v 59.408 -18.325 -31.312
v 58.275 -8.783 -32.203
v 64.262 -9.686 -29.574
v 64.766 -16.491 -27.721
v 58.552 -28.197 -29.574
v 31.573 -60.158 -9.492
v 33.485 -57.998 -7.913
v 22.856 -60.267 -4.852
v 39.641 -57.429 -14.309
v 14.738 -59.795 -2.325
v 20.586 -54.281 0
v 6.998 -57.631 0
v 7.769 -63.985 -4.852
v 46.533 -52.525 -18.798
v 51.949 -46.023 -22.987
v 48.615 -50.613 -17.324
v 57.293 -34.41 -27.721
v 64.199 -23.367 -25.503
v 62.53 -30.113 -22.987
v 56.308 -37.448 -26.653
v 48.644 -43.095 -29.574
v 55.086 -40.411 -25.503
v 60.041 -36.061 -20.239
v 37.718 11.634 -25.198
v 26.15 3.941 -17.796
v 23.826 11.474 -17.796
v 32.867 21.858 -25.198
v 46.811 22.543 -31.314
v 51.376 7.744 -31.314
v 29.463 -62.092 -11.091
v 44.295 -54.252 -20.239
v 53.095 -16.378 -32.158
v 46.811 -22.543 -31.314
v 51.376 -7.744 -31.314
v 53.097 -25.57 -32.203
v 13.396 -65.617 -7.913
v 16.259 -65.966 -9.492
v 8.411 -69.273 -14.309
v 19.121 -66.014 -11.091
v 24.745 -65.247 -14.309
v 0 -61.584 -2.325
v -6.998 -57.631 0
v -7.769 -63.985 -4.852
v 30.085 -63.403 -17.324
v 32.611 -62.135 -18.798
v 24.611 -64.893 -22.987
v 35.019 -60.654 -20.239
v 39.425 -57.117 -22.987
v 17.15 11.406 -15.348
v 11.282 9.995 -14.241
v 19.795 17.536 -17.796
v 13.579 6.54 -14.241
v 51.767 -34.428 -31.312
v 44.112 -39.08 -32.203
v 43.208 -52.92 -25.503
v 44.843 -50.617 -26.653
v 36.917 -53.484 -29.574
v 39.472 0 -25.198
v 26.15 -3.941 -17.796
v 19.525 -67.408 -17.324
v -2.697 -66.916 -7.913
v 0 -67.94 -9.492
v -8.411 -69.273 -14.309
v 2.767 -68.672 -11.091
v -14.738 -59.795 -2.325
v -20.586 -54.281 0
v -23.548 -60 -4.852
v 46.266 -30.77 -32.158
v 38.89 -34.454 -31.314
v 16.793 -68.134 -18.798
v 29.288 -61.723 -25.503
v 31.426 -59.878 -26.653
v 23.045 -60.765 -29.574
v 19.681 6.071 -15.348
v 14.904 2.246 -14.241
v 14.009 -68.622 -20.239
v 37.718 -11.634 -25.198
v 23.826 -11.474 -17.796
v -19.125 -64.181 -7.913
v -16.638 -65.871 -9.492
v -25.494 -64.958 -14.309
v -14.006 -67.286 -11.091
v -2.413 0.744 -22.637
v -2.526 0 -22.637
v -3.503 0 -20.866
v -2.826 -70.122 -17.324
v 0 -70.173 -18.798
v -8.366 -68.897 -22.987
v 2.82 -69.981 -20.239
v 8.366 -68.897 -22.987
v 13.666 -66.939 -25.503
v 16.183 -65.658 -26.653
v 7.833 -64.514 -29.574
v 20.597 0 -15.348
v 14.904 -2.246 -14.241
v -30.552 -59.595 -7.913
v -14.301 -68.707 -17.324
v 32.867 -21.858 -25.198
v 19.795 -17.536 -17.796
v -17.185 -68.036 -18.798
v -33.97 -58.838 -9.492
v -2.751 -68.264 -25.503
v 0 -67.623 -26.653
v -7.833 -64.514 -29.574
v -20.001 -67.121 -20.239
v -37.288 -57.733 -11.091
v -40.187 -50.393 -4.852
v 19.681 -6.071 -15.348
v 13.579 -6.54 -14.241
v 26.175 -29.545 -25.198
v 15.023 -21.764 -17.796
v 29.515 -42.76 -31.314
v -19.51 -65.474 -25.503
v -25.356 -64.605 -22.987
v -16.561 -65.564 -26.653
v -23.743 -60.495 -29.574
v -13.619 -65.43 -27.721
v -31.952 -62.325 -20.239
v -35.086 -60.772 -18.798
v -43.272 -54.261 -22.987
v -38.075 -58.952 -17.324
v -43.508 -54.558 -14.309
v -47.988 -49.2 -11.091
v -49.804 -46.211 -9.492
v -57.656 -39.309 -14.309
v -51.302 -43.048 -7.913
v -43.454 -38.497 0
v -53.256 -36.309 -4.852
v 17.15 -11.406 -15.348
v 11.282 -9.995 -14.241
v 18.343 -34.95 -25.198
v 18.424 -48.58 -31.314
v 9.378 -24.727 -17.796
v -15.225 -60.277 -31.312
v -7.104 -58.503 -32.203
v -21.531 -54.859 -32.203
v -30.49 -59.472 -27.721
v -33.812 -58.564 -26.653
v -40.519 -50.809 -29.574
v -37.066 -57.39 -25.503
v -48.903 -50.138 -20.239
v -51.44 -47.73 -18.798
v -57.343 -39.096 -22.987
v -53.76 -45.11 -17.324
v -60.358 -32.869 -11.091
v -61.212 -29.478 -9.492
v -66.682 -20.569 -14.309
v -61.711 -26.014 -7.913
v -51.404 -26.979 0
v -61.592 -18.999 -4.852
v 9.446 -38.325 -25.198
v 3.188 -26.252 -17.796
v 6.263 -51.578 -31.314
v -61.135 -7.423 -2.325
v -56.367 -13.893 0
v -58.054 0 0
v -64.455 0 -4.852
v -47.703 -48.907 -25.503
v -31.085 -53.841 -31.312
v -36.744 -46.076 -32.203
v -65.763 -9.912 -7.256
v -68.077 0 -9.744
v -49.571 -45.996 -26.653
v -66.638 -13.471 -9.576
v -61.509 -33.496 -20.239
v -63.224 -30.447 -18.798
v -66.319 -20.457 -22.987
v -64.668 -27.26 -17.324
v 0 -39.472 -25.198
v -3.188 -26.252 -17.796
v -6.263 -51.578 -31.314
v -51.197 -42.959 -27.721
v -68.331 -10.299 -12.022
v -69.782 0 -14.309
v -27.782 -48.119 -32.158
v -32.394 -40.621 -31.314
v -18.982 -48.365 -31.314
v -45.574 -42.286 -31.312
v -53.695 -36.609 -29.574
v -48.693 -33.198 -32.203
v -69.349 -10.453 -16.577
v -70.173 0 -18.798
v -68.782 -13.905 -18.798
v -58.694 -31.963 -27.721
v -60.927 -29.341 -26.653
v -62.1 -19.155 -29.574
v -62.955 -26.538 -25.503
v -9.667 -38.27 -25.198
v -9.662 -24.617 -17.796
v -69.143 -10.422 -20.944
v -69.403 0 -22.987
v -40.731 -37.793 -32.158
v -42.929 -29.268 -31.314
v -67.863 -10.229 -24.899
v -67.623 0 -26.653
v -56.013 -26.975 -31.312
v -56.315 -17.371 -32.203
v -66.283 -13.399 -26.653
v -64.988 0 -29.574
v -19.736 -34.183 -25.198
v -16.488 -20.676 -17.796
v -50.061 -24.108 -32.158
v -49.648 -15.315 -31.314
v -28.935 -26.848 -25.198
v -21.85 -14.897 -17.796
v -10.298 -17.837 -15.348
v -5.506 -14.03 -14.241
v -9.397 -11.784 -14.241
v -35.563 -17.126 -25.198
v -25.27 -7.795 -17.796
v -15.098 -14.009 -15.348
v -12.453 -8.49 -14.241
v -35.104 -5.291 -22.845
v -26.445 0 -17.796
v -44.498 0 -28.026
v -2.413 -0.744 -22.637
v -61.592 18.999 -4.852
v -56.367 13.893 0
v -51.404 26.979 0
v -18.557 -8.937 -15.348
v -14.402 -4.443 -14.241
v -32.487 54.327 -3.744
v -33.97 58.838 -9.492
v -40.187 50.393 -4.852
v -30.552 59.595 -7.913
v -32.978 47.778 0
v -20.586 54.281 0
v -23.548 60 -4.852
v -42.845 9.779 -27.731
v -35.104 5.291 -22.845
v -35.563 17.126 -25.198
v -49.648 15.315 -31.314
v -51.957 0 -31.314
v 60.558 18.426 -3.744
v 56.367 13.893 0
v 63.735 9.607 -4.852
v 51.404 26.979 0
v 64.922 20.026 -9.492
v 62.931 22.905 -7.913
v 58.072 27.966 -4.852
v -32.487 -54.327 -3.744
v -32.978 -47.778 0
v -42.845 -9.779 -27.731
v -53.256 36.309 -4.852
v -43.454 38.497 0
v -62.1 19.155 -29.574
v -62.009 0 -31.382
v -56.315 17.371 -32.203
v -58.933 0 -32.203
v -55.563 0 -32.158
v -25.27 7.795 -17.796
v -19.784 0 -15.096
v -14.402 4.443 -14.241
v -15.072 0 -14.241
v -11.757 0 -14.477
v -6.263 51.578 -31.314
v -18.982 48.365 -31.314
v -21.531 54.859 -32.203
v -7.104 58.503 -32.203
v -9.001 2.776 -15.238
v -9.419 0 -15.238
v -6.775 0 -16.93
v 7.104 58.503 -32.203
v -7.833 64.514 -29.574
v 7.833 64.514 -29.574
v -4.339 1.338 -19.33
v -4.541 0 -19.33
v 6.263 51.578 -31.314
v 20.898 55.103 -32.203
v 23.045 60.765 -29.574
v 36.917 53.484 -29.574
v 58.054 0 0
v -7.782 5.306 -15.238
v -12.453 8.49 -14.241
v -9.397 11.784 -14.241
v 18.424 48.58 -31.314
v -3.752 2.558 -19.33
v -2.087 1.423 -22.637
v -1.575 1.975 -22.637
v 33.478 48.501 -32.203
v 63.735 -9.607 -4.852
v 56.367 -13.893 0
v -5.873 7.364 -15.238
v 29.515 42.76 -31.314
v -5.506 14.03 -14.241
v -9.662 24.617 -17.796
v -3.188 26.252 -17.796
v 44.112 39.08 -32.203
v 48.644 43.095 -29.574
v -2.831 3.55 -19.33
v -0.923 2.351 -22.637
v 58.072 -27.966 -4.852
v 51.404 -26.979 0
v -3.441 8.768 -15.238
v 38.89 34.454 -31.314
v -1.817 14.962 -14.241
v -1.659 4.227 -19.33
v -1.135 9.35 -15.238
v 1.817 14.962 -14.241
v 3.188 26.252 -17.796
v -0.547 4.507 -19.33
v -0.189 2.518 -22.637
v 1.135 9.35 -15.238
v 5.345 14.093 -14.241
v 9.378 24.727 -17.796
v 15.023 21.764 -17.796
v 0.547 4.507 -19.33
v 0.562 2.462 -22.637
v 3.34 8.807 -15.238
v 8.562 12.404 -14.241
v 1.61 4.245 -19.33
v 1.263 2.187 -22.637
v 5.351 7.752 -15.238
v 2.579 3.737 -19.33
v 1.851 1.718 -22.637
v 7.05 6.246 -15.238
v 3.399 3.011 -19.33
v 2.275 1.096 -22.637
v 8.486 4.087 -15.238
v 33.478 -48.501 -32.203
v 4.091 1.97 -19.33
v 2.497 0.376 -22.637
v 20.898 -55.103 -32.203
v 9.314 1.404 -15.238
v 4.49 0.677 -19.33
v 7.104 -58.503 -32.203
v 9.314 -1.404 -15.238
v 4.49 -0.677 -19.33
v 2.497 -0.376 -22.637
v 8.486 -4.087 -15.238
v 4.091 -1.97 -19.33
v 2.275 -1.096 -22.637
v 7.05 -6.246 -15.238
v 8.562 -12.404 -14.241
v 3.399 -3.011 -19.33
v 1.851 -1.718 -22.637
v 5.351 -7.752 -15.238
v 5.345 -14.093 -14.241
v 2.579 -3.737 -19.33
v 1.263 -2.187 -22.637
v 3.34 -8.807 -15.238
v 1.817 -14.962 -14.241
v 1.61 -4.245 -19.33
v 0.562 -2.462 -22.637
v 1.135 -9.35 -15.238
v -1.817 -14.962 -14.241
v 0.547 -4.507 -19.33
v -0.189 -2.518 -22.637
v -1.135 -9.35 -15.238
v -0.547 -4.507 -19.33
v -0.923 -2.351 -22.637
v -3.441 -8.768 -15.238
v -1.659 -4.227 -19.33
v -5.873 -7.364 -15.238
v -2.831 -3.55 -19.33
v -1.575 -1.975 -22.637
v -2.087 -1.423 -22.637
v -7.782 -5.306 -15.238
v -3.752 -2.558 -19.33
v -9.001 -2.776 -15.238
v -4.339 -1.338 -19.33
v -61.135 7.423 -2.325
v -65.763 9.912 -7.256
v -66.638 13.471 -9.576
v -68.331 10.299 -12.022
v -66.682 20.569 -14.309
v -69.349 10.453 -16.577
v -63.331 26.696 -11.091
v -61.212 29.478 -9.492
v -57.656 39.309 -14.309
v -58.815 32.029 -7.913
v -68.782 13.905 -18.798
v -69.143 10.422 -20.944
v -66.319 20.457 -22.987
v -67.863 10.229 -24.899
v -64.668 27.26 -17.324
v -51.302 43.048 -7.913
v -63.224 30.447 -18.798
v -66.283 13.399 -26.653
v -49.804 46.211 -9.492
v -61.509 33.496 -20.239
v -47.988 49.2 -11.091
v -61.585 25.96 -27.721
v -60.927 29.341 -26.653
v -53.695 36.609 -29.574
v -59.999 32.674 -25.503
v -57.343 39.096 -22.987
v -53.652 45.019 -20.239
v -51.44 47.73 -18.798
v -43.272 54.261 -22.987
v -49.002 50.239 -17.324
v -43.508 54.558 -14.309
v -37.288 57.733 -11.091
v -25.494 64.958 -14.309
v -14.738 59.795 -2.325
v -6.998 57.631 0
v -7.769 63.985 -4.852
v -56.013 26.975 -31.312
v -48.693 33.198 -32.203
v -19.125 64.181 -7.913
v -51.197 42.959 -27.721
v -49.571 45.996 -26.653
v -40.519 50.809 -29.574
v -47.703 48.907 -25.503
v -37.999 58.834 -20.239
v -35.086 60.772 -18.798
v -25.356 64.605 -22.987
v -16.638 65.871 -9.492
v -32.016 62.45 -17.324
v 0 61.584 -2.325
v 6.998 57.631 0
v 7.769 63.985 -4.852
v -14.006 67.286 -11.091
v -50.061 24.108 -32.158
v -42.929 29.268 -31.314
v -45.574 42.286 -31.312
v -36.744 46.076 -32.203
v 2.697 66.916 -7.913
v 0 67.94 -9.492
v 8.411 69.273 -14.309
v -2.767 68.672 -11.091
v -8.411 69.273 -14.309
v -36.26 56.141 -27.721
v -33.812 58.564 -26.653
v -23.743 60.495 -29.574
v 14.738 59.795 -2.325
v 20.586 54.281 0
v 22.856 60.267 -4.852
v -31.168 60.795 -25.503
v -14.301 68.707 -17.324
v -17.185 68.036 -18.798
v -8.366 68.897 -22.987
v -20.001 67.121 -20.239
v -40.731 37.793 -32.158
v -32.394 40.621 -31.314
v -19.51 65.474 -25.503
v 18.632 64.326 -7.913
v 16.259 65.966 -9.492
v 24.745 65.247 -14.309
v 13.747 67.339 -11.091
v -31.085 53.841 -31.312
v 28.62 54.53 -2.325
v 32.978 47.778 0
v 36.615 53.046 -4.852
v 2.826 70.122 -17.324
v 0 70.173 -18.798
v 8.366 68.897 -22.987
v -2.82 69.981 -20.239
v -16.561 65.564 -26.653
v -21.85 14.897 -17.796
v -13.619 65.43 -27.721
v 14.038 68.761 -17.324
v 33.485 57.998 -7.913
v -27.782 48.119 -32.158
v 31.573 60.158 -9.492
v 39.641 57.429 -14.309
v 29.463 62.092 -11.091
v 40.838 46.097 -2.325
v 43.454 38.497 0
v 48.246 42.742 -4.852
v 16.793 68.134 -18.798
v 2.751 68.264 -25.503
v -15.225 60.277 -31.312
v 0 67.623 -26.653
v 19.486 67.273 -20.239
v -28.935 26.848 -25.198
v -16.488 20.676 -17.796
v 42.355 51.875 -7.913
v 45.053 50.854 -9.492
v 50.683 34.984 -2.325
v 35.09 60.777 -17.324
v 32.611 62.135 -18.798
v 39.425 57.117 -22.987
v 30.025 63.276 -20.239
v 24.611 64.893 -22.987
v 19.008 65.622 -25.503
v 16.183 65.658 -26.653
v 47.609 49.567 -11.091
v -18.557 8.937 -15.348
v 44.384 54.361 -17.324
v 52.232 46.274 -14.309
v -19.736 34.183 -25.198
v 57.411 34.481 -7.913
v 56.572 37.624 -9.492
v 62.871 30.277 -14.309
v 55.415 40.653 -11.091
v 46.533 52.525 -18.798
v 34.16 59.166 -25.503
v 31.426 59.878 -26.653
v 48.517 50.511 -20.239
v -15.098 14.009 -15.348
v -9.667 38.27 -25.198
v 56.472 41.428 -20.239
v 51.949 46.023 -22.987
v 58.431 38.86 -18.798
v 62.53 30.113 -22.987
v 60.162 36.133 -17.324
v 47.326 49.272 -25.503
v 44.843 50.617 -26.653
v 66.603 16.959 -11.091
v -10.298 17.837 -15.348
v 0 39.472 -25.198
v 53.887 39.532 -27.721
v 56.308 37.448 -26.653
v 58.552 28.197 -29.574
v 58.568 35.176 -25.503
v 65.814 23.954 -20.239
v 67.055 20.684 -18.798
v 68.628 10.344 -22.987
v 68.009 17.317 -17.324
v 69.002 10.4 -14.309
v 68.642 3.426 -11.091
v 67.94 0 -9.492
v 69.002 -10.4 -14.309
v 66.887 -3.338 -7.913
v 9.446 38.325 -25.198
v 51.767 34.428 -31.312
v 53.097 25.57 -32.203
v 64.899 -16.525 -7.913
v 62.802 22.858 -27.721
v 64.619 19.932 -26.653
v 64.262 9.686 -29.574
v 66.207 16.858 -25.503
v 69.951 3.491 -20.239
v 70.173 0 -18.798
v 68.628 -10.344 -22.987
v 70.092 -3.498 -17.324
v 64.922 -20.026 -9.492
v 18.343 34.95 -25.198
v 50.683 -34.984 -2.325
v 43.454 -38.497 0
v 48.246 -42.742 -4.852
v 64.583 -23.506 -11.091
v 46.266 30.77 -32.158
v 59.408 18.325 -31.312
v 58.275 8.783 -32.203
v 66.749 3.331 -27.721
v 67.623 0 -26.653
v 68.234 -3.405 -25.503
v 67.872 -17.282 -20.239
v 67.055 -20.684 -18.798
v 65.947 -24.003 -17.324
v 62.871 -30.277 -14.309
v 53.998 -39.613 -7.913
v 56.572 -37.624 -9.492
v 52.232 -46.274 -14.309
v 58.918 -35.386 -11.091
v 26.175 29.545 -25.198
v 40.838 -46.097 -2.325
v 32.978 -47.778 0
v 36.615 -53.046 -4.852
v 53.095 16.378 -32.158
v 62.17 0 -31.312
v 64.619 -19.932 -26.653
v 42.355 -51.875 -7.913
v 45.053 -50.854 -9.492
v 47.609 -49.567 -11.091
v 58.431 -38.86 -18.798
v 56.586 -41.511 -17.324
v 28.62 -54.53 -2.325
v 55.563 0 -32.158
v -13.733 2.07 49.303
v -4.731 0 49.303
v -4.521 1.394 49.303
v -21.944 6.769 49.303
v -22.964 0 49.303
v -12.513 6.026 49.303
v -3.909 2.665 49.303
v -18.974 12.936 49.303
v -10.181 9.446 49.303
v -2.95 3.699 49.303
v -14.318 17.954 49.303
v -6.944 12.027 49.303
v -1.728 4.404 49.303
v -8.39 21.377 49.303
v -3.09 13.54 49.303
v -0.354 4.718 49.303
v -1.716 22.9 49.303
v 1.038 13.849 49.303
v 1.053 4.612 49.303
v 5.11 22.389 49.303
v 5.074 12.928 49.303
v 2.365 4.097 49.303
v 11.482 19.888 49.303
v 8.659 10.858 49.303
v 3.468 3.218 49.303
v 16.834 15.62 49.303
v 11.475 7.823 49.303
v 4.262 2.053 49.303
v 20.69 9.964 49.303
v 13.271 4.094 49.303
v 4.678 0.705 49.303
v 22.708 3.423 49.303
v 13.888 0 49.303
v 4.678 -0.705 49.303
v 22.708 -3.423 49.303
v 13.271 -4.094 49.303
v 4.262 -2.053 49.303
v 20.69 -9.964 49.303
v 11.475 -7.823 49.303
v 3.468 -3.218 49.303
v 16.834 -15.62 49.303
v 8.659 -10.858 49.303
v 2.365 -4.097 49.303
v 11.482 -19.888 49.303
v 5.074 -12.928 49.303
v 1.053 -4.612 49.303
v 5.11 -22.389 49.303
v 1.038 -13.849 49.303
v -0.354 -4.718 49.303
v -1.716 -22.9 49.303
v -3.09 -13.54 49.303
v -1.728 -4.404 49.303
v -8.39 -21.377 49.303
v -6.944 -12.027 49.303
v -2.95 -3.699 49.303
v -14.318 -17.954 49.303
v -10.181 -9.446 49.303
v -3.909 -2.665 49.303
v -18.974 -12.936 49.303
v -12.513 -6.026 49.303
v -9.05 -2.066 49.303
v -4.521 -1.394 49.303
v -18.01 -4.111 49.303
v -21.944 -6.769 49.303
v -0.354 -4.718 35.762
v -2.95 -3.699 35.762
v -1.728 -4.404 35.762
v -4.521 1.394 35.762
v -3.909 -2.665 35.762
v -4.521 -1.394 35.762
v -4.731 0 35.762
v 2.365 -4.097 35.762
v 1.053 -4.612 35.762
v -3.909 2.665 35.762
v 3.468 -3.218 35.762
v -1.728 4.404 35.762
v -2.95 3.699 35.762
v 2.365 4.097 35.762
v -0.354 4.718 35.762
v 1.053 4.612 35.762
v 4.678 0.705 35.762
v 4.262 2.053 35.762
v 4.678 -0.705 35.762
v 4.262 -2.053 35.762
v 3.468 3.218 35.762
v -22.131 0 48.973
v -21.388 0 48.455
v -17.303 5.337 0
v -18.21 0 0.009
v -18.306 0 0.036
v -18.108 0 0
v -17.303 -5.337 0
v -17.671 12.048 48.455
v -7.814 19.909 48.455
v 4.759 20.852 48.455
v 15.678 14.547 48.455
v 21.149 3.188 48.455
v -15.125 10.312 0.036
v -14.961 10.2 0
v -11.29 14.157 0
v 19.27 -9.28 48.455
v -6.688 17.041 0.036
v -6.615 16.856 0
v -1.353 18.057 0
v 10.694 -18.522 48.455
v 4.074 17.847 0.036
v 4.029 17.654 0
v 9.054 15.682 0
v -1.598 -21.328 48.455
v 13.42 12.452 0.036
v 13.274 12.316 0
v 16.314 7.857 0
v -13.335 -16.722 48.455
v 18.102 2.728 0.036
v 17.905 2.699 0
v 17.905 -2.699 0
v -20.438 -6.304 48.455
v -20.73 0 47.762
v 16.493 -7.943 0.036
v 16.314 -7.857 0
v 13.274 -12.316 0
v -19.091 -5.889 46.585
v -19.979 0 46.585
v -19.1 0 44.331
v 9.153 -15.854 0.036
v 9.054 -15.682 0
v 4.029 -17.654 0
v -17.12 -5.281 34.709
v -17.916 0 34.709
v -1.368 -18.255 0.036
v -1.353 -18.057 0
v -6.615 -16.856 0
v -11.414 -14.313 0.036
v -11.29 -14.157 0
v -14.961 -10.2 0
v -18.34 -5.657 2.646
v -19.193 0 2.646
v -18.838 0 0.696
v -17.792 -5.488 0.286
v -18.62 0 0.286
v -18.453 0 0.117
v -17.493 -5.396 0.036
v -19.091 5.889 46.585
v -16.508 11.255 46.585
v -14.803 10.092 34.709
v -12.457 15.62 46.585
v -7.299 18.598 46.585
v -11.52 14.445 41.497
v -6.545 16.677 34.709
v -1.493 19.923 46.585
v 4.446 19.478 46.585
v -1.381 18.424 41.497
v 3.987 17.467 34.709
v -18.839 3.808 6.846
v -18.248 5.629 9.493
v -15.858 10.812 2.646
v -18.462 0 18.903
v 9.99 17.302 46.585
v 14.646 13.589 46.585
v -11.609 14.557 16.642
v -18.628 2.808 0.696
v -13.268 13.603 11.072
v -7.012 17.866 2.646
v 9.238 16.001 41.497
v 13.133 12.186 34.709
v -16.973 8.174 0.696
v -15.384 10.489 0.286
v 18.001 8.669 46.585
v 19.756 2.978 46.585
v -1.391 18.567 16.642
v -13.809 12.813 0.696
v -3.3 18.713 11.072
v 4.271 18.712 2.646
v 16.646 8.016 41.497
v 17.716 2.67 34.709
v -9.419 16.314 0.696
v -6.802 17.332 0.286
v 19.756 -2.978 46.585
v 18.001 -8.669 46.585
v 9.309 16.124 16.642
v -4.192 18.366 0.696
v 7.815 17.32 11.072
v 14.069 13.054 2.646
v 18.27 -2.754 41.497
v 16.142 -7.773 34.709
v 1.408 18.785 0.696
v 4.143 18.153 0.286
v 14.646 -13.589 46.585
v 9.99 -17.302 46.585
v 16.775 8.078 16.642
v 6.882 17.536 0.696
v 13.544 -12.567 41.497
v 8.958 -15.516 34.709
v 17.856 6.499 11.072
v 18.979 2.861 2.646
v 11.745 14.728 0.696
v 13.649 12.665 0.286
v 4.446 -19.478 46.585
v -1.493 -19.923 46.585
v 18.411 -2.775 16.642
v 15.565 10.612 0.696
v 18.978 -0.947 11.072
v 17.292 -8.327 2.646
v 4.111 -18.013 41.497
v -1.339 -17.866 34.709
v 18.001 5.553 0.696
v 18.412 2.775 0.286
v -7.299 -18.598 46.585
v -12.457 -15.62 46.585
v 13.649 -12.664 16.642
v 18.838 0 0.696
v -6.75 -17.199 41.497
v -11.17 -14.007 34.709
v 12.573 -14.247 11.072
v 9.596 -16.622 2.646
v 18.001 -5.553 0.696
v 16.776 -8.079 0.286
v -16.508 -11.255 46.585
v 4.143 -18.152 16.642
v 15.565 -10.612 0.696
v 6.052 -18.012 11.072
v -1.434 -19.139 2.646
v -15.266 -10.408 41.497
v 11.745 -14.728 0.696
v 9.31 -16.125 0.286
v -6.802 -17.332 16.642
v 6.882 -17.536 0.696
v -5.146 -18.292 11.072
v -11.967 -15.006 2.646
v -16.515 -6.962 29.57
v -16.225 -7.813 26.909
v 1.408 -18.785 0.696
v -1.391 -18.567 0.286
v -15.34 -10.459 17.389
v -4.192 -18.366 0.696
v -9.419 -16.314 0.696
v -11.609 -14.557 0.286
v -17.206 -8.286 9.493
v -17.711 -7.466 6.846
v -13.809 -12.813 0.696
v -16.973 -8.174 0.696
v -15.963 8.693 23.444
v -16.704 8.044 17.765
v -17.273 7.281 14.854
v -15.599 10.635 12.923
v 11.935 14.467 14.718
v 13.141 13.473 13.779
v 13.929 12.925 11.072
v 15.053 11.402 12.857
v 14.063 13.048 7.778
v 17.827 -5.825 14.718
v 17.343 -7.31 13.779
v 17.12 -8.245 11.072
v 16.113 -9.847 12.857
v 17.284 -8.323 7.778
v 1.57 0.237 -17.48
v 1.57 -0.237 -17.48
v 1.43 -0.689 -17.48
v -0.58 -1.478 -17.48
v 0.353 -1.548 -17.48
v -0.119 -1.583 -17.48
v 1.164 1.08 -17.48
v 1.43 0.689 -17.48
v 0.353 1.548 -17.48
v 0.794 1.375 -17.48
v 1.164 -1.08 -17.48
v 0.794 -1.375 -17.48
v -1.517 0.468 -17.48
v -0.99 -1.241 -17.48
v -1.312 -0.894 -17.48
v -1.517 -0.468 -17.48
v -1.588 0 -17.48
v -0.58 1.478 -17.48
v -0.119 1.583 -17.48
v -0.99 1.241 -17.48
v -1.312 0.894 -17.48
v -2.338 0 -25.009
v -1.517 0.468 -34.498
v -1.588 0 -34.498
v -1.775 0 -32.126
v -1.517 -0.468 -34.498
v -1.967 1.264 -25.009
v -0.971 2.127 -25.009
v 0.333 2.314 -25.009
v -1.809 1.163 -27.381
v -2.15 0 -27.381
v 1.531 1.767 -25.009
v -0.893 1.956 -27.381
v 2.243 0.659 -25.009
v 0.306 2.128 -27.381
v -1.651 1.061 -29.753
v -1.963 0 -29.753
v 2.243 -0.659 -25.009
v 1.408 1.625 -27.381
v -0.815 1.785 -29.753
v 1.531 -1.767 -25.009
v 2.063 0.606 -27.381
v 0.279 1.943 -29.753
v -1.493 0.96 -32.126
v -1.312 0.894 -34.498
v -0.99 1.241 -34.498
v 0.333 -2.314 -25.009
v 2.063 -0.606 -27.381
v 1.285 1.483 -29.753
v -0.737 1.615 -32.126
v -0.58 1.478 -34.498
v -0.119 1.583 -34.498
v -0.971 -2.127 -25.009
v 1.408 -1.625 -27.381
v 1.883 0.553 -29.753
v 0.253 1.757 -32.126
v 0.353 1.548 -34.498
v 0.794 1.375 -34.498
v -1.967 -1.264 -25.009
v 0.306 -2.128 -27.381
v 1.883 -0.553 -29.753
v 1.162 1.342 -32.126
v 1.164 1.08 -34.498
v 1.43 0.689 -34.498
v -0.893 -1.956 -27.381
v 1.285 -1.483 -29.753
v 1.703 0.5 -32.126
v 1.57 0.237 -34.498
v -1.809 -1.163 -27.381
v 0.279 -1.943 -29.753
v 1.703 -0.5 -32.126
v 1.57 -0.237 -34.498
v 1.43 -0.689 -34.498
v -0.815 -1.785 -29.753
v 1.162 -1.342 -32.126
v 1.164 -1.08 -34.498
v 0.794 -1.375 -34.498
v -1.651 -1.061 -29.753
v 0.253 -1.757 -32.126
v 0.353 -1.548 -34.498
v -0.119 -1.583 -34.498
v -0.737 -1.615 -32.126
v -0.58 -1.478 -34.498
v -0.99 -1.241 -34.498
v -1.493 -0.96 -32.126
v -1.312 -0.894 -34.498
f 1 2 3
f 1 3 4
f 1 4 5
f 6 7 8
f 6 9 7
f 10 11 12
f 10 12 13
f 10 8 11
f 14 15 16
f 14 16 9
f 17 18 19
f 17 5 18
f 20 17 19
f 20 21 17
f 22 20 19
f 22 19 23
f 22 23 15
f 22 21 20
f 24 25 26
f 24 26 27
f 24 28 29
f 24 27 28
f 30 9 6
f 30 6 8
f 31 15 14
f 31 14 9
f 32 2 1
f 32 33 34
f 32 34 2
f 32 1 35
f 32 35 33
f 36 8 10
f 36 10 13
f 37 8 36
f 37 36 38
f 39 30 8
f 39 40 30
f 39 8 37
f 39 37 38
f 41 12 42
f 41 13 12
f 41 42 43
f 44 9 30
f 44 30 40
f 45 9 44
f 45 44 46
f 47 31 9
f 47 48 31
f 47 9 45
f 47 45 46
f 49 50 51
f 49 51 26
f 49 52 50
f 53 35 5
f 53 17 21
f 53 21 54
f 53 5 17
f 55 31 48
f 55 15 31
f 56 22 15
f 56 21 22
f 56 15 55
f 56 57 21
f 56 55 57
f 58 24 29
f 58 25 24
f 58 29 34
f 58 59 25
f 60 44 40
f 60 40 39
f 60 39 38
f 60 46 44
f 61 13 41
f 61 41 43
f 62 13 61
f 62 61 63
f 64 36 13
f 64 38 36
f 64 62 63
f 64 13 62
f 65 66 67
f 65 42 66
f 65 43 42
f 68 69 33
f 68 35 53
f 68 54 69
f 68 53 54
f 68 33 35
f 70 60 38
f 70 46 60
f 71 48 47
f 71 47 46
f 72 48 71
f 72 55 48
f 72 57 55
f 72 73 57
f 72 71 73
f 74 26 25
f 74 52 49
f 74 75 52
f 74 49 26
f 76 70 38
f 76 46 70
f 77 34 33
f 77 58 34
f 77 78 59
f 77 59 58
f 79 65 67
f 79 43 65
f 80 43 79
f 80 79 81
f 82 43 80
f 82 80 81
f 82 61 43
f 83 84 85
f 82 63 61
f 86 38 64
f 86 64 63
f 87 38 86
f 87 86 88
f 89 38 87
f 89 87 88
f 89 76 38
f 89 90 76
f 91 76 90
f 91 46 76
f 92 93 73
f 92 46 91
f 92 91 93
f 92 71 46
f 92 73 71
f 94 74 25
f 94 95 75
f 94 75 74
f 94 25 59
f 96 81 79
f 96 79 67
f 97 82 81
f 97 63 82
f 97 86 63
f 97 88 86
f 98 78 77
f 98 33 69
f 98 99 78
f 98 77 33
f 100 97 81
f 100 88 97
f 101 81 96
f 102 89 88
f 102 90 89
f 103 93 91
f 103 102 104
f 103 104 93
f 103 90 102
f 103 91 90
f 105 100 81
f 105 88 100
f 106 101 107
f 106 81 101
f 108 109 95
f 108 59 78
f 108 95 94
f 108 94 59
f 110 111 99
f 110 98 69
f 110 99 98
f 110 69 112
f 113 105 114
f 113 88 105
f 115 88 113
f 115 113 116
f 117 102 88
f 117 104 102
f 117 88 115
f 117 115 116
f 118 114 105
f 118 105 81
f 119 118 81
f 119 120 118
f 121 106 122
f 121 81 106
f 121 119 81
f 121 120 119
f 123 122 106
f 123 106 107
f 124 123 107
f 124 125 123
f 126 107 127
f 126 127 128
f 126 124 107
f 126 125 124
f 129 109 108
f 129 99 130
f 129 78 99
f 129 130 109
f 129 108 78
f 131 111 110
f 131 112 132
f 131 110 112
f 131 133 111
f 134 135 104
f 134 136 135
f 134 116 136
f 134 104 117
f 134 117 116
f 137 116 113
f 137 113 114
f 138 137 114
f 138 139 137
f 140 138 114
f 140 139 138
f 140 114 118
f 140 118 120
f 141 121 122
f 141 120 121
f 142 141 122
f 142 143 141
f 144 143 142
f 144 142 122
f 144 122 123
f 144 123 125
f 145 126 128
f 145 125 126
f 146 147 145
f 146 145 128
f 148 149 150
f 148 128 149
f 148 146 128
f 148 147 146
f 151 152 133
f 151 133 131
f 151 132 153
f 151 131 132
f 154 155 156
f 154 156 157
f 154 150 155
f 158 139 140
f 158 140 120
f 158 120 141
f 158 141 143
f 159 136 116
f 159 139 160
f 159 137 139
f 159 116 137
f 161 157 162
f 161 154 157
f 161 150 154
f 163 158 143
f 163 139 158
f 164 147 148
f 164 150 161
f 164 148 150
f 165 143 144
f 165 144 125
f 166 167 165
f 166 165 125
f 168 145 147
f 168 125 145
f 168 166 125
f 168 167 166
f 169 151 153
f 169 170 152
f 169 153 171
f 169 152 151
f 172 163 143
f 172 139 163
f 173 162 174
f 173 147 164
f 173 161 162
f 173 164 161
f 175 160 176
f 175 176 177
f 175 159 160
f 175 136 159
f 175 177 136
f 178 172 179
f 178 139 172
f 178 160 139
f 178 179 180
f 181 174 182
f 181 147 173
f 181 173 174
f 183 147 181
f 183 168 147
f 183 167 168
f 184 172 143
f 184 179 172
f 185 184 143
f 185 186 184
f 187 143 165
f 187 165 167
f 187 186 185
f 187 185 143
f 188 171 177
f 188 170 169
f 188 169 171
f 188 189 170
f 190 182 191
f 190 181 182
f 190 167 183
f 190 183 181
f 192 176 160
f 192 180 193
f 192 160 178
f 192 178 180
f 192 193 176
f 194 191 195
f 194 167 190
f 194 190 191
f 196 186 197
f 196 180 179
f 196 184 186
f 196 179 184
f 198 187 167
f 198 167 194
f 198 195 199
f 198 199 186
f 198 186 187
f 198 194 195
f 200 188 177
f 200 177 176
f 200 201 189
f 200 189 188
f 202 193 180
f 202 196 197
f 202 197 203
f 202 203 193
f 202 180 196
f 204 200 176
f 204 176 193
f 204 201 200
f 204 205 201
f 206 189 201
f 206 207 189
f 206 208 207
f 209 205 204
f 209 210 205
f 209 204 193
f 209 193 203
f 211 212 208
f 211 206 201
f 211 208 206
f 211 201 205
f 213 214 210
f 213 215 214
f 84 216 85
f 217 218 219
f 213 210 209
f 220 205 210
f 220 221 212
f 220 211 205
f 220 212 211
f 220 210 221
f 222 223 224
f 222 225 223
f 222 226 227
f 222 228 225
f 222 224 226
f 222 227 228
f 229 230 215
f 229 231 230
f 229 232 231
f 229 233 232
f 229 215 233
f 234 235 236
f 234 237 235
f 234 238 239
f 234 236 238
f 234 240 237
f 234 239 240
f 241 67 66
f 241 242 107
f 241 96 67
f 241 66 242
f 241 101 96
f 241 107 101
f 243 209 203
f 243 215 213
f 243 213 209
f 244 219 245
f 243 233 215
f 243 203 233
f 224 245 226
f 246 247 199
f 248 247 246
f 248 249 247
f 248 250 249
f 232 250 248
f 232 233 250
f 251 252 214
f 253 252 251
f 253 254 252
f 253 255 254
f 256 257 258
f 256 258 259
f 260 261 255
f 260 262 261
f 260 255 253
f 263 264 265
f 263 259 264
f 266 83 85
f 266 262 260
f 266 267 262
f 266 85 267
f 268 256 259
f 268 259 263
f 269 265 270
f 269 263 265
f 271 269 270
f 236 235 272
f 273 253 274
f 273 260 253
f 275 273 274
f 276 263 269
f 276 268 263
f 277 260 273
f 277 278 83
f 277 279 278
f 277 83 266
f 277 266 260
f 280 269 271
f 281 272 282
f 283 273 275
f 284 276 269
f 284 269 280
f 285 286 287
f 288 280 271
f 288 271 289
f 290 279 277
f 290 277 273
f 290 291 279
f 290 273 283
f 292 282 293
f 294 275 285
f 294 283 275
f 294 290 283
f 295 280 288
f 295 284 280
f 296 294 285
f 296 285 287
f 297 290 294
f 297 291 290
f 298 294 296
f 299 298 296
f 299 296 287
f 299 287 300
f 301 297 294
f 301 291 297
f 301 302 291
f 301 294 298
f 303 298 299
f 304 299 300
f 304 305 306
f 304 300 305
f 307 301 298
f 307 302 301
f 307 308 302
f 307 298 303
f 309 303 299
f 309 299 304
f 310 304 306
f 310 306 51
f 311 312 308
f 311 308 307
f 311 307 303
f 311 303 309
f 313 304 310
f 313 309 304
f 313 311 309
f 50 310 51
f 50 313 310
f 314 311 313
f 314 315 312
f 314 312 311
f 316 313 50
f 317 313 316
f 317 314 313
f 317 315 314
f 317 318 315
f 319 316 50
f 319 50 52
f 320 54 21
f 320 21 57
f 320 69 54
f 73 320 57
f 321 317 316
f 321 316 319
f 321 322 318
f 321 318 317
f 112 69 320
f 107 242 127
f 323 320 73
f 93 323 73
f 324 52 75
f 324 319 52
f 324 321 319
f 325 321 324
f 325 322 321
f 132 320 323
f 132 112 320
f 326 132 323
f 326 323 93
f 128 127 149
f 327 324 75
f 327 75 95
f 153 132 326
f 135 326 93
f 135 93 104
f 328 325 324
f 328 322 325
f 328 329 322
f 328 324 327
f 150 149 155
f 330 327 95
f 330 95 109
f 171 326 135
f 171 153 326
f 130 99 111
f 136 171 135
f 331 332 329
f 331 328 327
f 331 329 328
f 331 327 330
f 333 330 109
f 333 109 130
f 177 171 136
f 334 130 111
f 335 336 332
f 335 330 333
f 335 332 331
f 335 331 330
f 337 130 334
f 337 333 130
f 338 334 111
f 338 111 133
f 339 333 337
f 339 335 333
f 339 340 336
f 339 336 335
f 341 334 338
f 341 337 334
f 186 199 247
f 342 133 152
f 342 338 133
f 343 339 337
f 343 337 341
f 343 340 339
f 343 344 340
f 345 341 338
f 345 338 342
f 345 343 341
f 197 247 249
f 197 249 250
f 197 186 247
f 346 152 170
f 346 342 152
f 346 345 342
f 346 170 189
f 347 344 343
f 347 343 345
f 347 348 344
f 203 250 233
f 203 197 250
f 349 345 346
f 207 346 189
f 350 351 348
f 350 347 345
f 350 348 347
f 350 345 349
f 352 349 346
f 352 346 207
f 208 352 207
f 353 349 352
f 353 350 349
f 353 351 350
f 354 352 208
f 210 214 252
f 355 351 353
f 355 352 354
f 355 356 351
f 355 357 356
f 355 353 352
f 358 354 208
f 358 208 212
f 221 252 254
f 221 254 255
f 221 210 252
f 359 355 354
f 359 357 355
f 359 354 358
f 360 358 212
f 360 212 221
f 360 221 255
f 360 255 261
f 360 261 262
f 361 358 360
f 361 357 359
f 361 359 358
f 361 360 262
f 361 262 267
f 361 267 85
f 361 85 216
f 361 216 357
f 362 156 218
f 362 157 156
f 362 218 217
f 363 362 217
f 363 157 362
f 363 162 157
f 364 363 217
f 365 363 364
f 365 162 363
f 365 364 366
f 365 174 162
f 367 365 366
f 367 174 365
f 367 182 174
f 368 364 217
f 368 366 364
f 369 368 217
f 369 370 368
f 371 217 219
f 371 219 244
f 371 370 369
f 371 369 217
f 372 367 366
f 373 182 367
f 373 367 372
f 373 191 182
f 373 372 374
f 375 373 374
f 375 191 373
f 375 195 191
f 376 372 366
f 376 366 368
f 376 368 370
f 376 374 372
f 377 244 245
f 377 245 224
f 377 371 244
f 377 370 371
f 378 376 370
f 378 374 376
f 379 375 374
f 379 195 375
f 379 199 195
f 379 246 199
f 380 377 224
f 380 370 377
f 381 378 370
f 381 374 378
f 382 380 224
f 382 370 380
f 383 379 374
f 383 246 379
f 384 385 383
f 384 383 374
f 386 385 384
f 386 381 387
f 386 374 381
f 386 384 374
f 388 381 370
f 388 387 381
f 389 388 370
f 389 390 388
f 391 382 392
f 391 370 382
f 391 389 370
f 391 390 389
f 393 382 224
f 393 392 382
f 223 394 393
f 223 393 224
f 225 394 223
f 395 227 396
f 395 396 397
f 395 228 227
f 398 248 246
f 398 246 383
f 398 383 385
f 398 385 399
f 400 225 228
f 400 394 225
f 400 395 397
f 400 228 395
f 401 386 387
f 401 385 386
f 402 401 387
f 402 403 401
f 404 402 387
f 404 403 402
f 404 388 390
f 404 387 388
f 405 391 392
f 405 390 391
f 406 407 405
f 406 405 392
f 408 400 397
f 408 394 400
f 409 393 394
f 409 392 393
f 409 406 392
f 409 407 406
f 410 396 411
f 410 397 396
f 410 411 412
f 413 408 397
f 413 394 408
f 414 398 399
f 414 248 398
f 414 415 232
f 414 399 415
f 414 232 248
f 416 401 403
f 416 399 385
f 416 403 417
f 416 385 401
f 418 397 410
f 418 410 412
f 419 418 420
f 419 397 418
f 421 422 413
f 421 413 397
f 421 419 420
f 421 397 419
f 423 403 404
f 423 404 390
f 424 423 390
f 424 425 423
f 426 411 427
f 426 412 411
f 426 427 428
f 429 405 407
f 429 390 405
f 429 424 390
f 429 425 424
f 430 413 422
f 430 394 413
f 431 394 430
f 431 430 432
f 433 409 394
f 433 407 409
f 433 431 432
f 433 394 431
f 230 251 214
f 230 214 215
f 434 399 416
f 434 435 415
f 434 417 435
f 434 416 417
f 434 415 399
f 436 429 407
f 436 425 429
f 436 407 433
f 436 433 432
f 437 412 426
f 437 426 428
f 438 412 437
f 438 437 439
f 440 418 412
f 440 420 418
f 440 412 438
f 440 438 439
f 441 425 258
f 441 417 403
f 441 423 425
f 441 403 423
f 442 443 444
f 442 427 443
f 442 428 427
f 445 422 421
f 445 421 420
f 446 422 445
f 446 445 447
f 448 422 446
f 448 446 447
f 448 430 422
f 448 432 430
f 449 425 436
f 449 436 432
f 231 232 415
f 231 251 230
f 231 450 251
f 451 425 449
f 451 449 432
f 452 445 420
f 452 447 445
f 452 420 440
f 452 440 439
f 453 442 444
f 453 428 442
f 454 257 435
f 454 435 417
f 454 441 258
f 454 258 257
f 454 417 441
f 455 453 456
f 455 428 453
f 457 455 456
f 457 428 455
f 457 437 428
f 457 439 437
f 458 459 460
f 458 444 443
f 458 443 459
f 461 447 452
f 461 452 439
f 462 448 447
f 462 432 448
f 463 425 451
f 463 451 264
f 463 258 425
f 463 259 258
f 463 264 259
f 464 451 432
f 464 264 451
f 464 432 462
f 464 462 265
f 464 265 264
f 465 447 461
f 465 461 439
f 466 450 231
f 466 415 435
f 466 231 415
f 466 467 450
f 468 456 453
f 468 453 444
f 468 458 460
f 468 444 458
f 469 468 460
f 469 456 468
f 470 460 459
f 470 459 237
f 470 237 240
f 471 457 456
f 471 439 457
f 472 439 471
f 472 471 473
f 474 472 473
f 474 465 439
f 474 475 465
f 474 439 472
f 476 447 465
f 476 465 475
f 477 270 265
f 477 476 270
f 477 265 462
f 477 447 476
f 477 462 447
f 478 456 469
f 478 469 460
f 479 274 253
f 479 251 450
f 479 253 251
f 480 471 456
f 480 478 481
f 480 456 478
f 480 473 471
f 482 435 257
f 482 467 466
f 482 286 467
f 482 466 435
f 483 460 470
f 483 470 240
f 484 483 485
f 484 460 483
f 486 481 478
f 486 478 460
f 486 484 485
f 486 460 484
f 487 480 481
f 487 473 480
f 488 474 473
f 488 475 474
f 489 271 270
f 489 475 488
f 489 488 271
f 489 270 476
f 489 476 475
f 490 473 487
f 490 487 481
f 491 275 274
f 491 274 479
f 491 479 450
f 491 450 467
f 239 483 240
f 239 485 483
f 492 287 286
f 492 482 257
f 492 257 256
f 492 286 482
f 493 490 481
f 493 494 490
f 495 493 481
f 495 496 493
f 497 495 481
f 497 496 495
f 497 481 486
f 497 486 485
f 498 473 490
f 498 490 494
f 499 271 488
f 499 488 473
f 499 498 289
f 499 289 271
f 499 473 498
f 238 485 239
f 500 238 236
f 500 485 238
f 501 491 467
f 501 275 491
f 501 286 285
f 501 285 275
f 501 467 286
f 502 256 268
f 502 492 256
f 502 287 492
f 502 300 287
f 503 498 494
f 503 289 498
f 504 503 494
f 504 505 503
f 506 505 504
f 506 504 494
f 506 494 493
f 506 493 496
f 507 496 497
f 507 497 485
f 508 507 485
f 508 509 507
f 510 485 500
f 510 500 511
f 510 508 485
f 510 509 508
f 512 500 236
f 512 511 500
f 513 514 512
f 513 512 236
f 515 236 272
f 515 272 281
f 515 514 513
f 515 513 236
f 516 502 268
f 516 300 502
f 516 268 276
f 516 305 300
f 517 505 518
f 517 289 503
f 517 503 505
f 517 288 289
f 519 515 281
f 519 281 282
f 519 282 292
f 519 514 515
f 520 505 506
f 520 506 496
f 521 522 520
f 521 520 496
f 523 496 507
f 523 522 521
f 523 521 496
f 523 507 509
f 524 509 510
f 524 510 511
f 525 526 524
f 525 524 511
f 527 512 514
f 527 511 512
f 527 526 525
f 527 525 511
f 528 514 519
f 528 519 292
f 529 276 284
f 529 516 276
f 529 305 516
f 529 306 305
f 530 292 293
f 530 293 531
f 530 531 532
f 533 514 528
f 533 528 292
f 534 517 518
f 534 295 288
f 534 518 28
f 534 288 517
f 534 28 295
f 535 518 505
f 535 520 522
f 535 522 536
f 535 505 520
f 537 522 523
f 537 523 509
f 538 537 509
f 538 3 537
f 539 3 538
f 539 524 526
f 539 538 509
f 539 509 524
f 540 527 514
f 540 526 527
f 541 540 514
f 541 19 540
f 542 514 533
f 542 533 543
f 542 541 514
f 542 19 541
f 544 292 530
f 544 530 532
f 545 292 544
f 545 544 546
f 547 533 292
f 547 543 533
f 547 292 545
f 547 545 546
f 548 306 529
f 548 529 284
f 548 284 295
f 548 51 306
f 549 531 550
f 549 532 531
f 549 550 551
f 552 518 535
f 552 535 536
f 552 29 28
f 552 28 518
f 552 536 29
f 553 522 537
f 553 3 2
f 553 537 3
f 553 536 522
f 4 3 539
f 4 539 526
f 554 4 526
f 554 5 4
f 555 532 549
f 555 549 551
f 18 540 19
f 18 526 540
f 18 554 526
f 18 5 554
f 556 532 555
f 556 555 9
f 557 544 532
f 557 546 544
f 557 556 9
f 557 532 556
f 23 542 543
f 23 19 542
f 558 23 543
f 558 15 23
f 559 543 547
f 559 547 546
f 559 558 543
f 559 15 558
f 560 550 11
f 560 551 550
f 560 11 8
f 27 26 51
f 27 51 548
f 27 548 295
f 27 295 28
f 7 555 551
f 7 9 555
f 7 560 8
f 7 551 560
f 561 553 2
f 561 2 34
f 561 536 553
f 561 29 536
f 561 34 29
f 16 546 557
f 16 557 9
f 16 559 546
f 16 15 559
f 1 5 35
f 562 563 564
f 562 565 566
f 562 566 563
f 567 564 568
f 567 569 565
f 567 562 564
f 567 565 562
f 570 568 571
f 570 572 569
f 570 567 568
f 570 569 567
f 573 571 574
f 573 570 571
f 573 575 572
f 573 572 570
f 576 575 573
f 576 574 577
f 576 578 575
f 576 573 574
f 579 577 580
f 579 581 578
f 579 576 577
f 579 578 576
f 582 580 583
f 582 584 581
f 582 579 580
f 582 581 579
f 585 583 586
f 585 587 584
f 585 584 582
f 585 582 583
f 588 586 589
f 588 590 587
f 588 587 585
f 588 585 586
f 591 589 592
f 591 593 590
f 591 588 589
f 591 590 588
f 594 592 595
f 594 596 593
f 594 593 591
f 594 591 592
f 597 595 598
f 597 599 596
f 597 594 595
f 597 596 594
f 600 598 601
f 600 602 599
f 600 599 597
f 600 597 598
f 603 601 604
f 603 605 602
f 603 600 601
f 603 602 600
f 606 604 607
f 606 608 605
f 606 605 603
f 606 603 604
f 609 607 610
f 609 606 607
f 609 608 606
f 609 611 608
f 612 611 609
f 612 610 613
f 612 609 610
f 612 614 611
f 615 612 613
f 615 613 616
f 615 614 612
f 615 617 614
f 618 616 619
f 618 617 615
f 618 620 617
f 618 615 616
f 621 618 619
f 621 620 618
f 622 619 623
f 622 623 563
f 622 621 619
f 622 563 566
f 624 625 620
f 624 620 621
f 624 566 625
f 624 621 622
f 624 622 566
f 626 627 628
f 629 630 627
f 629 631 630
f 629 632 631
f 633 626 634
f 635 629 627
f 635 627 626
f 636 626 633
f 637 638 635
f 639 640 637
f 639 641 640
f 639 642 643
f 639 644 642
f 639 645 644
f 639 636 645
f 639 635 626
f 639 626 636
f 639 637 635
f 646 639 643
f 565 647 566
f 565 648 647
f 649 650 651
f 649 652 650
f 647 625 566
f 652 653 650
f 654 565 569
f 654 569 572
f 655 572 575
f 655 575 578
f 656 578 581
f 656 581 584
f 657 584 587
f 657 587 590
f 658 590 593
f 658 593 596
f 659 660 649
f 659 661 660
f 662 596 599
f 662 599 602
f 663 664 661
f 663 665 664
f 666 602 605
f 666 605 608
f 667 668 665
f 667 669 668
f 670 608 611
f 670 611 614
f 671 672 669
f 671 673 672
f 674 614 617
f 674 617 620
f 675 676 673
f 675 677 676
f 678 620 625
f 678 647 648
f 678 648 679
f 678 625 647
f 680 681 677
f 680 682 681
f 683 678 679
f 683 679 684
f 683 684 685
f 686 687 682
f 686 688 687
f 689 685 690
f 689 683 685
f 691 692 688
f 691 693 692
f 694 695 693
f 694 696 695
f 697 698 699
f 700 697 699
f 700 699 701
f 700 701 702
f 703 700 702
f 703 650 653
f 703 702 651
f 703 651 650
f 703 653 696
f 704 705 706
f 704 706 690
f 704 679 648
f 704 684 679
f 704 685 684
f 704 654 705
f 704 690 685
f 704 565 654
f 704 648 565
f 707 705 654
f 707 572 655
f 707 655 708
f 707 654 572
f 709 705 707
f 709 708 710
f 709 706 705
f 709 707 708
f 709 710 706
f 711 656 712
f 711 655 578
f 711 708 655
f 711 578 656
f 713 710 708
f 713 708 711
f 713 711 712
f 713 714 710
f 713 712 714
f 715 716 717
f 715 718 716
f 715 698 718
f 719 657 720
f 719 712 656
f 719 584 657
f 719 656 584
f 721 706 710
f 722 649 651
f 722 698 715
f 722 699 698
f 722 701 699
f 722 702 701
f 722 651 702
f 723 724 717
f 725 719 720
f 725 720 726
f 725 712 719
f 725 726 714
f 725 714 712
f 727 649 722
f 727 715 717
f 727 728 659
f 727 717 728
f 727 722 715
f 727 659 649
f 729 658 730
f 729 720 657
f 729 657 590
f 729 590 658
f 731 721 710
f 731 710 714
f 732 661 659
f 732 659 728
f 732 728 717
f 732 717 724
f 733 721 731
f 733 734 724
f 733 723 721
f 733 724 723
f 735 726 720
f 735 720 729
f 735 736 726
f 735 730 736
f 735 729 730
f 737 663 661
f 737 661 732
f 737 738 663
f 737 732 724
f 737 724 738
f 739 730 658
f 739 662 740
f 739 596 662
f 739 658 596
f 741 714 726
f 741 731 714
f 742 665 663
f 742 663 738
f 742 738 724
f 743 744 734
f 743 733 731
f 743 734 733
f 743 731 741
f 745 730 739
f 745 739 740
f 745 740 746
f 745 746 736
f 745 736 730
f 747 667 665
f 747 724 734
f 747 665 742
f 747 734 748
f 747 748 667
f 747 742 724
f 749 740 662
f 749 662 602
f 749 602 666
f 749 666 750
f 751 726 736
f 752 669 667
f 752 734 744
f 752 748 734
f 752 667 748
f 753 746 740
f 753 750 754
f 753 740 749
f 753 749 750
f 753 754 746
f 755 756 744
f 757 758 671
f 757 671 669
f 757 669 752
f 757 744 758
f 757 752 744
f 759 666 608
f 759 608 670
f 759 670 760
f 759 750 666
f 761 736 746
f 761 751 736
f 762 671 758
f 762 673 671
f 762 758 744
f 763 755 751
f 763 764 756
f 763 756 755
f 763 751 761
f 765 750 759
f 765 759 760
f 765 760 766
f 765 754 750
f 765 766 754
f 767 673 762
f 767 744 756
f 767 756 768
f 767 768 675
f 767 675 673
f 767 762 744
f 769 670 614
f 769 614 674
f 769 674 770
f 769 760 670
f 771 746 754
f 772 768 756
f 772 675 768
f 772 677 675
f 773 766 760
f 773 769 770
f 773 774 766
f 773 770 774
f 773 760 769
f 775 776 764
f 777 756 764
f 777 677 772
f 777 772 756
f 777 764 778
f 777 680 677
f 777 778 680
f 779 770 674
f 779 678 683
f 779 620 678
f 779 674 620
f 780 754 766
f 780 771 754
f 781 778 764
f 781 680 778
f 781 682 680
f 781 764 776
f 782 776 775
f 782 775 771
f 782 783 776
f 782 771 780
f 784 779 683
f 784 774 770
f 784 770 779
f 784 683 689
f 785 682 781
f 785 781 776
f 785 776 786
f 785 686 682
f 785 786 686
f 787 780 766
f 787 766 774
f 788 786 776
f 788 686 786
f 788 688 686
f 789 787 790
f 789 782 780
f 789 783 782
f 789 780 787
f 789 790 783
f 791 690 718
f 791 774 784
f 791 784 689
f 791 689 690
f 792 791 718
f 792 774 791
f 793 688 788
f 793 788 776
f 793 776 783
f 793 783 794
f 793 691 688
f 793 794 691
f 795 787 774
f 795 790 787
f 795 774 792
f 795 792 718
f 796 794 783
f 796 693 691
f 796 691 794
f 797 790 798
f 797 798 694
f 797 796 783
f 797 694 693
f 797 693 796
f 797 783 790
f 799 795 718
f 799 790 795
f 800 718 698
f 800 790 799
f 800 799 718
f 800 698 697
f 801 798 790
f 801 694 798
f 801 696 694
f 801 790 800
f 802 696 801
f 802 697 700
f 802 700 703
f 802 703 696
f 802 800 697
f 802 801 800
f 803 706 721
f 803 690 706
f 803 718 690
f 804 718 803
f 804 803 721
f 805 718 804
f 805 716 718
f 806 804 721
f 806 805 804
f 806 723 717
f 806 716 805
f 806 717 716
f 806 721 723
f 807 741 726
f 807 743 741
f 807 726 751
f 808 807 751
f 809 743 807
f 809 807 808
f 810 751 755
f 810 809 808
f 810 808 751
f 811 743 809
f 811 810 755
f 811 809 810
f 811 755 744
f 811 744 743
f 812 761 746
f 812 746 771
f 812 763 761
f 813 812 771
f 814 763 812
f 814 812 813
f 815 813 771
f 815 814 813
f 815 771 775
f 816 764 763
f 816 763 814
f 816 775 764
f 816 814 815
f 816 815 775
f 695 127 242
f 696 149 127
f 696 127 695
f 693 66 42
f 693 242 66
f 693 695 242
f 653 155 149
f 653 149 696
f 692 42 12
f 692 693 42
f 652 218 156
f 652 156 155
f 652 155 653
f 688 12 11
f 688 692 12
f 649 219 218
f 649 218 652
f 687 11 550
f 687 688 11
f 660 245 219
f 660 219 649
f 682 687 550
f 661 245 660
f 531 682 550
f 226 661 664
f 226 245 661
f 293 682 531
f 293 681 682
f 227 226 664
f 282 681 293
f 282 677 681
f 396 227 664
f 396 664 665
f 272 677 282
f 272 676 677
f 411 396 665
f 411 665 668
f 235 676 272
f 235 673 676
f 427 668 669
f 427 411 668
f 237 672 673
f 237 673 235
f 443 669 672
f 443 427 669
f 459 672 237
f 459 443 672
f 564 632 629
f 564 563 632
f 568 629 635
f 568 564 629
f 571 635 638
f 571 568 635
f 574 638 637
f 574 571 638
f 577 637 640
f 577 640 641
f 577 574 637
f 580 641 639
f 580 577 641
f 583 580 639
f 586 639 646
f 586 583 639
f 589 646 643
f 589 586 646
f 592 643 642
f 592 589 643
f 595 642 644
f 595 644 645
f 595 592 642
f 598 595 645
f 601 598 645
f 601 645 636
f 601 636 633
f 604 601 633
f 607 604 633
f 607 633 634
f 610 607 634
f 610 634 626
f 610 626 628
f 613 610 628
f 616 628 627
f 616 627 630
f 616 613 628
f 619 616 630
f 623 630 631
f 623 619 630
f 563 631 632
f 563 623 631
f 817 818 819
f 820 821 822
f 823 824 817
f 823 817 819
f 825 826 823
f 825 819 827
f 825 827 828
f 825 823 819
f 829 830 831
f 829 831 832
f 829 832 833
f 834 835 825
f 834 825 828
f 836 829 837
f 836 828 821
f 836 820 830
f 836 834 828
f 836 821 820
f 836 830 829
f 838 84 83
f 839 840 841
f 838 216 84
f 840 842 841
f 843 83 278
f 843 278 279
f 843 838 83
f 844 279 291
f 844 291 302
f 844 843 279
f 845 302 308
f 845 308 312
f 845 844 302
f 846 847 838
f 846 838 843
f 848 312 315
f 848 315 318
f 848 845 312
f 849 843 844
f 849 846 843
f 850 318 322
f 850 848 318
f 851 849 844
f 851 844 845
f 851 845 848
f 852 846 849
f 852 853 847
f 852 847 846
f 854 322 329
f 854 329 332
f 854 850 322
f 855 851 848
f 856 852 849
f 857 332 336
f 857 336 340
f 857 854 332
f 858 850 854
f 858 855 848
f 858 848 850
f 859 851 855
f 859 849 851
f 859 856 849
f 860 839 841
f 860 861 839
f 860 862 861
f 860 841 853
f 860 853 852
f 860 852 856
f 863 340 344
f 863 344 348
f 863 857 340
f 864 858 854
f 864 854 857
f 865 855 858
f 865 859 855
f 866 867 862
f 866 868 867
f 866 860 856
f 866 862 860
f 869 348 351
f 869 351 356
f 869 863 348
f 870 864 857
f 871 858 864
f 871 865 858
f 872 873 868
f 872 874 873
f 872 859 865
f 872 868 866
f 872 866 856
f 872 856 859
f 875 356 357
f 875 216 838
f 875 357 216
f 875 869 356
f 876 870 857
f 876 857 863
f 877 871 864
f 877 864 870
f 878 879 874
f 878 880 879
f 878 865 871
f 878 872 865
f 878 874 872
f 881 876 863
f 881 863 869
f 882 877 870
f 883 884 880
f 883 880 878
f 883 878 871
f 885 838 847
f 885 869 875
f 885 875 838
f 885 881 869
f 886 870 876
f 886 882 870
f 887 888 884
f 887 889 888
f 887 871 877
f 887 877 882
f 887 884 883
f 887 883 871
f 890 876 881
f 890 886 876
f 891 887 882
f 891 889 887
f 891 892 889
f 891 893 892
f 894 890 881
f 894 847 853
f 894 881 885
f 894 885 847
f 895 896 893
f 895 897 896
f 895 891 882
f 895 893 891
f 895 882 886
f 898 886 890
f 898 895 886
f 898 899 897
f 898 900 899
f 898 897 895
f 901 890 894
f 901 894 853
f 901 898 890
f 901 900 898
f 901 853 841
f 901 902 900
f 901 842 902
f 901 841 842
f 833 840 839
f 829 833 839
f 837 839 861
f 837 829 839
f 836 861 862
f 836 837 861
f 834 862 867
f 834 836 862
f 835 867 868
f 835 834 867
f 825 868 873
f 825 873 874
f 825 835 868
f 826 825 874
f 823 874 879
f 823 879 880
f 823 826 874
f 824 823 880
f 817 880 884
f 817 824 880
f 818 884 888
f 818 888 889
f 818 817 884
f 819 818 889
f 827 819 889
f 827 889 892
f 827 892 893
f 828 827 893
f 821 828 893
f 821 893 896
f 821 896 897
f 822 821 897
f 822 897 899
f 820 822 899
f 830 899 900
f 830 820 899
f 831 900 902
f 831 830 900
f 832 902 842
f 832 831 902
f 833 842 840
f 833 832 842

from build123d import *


with BuildPart() as f1:
    # F0 (on Front) → F1 (revolve)
    with BuildSketch(Plane.XZ):
        with BuildLine():
            add(Edge.make_bspline(
                [(-22.9642885055, 49.3032115787), (-12.2969623123, 46.4702763814), (-22.4618348296, 0), (-18.1075624479, 0)],
                knots=[2.9191818186, 2.9191818186, 2.9191818186, 2.9191818186, 49.811763635, 49.811763635, 49.811763635, 49.811763635], degree=3))
            Line((-18.1075624479, 0), (-58.0540070499, 0))
            add(Edge.make_bspline(
                [(-58.0540070499, 0), (-77.442342212, -11.0468430516), (-61.7601881483, -58.9445413015), (-14.4063218335, 1.1245636718), (-2.5255118479, -22.637057851)],
                knots=[0, 0, 0, 0, 0.4307775151, 1, 1, 1, 1], degree=3))
            Line((-2.5255118479, -22.637057851), (-1.5875, -34.4977003213))
            Line((-1.5875, -34.4977003213), (-1.5875, -17.4797003213))
            Line((-1.5875, -17.4797003213), (0, -17.4797003213))
            Line((0, -17.4797003213), (0, 35.7623191787))
            Line((0, 35.7623191787), (-4.73075, 35.7623191787))
            Line((-4.73075, 35.7623191787), (-4.73075, 49.3032115787))
            add(Edge.make_bspline(
                [(-4.73075, 49.3032115787), (-10.7331998616, 49.3032115787), (-17.0701686457, 49.3032115787), (-22.9642885055, 49.3032115787)],
                knots=[4.8317135305, 4.8317135305, 4.8317135305, 4.8317135305, 22.8923422862, 22.8923422862, 22.8923422862, 22.8923422862], degree=3))
        make_face()
    revolve(axis=Axis((0, 0, 9.1413094287), (0, 0, -1)))


solid = f1.part
